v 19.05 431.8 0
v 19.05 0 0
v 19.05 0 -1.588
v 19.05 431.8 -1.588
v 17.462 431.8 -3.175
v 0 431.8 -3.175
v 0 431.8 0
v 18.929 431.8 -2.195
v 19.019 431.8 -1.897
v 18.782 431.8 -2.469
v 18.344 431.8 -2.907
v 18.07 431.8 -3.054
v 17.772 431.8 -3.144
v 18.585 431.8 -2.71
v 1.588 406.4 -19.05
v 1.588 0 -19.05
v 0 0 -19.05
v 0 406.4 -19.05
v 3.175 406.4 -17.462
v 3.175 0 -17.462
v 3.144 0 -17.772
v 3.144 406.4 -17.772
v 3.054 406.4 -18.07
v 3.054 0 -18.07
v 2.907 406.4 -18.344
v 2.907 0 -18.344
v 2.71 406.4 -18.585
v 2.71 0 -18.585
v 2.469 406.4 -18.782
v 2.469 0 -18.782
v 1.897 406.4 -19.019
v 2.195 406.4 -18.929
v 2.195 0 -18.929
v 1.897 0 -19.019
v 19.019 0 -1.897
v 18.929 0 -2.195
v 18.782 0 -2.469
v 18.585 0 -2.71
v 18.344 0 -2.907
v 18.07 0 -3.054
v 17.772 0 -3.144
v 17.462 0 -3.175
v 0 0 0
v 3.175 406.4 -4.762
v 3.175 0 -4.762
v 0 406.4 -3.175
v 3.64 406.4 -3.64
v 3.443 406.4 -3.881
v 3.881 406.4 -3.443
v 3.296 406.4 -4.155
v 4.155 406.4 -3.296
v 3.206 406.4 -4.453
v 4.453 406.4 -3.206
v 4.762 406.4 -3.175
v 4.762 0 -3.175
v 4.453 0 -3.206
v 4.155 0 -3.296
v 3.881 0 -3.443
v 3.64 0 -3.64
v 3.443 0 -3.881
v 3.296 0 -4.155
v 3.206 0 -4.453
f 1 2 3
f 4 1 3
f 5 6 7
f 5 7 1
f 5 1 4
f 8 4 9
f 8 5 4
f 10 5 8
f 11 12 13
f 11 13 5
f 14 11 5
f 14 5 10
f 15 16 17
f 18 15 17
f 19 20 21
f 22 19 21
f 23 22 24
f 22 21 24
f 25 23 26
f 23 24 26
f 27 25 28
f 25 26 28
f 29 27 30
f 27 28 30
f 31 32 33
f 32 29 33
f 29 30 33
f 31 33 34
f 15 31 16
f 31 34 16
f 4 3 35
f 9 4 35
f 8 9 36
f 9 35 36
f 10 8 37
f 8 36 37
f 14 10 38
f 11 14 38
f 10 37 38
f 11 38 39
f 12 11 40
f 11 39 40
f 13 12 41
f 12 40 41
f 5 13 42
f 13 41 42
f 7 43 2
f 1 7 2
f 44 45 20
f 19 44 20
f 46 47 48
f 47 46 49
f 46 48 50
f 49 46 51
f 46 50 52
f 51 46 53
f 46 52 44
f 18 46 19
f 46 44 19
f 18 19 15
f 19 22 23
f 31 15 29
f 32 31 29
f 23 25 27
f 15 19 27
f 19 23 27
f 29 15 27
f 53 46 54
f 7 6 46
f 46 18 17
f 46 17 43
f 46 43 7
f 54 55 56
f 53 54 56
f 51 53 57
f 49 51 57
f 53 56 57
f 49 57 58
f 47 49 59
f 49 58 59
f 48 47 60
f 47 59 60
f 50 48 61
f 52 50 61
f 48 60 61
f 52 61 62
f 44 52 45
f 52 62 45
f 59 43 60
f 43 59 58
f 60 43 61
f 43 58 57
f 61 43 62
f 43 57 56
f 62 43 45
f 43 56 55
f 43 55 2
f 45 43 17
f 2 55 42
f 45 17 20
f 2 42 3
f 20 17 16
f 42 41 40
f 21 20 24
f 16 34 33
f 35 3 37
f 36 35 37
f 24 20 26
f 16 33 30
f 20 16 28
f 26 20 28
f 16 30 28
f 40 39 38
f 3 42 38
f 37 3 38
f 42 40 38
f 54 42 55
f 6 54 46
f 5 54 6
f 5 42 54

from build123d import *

# Parameters (mm, degrees)
BOSS_EXTRUDE1_DEPTH = 431.8
SKETCH4_W           = 15.875
SKETCH4_H           = 25.4
CUT_EXTRUDE1_DEPTH  = 6.35
SKETCH5_W           = 1.5875
SKETCH5_H           = 25.4
CUT_EXTRUDE2_DEPTH  = 6.35


with BuildPart() as part:
    # Sketch2 → Boss-Extrude1 (new body)
    with BuildSketch(Plane(origin=(0, 0, 0), x_dir=(1, 0, 0), z_dir=(0, 1, 0))):
        with BuildLine():
            Line((0, 0), (19.05, 0))
            Line((19.05, 0), (19.05, 1.5875))
            ThreePointArc((19.05, 1.5875), (18.585032015, 2.710032015), (17.4625, 3.175))
            Line((17.4625, 3.175), (4.7625, 3.175))
            ThreePointArc((4.7625, 3.175), (3.639967985, 3.639967985), (3.175, 4.7625))
            Line((3.175, 4.7625), (3.175, 17.4625))
            ThreePointArc((3.175, 17.4625), (2.710032015, 18.585032015), (1.5875, 19.05))
            Line((1.5875, 19.05), (0, 19.05))
            Line((0, 19.05), (0, 0))
        make_face()
    extrude(amount=BOSS_EXTRUDE1_DEPTH)

    # Sketch4 → Cut-Extrude1 (cut)
    with BuildSketch(Plane(origin=(3.175, 0, 0), x_dir=(0, 0, -1), z_dir=(1, 0, 0))):
        with Locations((11.1125, 419.1)):
            Rectangle(SKETCH4_W, SKETCH4_H)
    extrude(amount=-CUT_EXTRUDE1_DEPTH, mode=Mode.SUBTRACT)

    # Sketch5 → Cut-Extrude2 (cut)
    with BuildSketch(Plane.ZY.offset(-3.175)):
        with Locations((-3.96875, 419.1)):
            Rectangle(SKETCH5_W, SKETCH5_H)
    extrude(amount=-CUT_EXTRUDE2_DEPTH, mode=Mode.SUBTRACT)


solid = part.part
